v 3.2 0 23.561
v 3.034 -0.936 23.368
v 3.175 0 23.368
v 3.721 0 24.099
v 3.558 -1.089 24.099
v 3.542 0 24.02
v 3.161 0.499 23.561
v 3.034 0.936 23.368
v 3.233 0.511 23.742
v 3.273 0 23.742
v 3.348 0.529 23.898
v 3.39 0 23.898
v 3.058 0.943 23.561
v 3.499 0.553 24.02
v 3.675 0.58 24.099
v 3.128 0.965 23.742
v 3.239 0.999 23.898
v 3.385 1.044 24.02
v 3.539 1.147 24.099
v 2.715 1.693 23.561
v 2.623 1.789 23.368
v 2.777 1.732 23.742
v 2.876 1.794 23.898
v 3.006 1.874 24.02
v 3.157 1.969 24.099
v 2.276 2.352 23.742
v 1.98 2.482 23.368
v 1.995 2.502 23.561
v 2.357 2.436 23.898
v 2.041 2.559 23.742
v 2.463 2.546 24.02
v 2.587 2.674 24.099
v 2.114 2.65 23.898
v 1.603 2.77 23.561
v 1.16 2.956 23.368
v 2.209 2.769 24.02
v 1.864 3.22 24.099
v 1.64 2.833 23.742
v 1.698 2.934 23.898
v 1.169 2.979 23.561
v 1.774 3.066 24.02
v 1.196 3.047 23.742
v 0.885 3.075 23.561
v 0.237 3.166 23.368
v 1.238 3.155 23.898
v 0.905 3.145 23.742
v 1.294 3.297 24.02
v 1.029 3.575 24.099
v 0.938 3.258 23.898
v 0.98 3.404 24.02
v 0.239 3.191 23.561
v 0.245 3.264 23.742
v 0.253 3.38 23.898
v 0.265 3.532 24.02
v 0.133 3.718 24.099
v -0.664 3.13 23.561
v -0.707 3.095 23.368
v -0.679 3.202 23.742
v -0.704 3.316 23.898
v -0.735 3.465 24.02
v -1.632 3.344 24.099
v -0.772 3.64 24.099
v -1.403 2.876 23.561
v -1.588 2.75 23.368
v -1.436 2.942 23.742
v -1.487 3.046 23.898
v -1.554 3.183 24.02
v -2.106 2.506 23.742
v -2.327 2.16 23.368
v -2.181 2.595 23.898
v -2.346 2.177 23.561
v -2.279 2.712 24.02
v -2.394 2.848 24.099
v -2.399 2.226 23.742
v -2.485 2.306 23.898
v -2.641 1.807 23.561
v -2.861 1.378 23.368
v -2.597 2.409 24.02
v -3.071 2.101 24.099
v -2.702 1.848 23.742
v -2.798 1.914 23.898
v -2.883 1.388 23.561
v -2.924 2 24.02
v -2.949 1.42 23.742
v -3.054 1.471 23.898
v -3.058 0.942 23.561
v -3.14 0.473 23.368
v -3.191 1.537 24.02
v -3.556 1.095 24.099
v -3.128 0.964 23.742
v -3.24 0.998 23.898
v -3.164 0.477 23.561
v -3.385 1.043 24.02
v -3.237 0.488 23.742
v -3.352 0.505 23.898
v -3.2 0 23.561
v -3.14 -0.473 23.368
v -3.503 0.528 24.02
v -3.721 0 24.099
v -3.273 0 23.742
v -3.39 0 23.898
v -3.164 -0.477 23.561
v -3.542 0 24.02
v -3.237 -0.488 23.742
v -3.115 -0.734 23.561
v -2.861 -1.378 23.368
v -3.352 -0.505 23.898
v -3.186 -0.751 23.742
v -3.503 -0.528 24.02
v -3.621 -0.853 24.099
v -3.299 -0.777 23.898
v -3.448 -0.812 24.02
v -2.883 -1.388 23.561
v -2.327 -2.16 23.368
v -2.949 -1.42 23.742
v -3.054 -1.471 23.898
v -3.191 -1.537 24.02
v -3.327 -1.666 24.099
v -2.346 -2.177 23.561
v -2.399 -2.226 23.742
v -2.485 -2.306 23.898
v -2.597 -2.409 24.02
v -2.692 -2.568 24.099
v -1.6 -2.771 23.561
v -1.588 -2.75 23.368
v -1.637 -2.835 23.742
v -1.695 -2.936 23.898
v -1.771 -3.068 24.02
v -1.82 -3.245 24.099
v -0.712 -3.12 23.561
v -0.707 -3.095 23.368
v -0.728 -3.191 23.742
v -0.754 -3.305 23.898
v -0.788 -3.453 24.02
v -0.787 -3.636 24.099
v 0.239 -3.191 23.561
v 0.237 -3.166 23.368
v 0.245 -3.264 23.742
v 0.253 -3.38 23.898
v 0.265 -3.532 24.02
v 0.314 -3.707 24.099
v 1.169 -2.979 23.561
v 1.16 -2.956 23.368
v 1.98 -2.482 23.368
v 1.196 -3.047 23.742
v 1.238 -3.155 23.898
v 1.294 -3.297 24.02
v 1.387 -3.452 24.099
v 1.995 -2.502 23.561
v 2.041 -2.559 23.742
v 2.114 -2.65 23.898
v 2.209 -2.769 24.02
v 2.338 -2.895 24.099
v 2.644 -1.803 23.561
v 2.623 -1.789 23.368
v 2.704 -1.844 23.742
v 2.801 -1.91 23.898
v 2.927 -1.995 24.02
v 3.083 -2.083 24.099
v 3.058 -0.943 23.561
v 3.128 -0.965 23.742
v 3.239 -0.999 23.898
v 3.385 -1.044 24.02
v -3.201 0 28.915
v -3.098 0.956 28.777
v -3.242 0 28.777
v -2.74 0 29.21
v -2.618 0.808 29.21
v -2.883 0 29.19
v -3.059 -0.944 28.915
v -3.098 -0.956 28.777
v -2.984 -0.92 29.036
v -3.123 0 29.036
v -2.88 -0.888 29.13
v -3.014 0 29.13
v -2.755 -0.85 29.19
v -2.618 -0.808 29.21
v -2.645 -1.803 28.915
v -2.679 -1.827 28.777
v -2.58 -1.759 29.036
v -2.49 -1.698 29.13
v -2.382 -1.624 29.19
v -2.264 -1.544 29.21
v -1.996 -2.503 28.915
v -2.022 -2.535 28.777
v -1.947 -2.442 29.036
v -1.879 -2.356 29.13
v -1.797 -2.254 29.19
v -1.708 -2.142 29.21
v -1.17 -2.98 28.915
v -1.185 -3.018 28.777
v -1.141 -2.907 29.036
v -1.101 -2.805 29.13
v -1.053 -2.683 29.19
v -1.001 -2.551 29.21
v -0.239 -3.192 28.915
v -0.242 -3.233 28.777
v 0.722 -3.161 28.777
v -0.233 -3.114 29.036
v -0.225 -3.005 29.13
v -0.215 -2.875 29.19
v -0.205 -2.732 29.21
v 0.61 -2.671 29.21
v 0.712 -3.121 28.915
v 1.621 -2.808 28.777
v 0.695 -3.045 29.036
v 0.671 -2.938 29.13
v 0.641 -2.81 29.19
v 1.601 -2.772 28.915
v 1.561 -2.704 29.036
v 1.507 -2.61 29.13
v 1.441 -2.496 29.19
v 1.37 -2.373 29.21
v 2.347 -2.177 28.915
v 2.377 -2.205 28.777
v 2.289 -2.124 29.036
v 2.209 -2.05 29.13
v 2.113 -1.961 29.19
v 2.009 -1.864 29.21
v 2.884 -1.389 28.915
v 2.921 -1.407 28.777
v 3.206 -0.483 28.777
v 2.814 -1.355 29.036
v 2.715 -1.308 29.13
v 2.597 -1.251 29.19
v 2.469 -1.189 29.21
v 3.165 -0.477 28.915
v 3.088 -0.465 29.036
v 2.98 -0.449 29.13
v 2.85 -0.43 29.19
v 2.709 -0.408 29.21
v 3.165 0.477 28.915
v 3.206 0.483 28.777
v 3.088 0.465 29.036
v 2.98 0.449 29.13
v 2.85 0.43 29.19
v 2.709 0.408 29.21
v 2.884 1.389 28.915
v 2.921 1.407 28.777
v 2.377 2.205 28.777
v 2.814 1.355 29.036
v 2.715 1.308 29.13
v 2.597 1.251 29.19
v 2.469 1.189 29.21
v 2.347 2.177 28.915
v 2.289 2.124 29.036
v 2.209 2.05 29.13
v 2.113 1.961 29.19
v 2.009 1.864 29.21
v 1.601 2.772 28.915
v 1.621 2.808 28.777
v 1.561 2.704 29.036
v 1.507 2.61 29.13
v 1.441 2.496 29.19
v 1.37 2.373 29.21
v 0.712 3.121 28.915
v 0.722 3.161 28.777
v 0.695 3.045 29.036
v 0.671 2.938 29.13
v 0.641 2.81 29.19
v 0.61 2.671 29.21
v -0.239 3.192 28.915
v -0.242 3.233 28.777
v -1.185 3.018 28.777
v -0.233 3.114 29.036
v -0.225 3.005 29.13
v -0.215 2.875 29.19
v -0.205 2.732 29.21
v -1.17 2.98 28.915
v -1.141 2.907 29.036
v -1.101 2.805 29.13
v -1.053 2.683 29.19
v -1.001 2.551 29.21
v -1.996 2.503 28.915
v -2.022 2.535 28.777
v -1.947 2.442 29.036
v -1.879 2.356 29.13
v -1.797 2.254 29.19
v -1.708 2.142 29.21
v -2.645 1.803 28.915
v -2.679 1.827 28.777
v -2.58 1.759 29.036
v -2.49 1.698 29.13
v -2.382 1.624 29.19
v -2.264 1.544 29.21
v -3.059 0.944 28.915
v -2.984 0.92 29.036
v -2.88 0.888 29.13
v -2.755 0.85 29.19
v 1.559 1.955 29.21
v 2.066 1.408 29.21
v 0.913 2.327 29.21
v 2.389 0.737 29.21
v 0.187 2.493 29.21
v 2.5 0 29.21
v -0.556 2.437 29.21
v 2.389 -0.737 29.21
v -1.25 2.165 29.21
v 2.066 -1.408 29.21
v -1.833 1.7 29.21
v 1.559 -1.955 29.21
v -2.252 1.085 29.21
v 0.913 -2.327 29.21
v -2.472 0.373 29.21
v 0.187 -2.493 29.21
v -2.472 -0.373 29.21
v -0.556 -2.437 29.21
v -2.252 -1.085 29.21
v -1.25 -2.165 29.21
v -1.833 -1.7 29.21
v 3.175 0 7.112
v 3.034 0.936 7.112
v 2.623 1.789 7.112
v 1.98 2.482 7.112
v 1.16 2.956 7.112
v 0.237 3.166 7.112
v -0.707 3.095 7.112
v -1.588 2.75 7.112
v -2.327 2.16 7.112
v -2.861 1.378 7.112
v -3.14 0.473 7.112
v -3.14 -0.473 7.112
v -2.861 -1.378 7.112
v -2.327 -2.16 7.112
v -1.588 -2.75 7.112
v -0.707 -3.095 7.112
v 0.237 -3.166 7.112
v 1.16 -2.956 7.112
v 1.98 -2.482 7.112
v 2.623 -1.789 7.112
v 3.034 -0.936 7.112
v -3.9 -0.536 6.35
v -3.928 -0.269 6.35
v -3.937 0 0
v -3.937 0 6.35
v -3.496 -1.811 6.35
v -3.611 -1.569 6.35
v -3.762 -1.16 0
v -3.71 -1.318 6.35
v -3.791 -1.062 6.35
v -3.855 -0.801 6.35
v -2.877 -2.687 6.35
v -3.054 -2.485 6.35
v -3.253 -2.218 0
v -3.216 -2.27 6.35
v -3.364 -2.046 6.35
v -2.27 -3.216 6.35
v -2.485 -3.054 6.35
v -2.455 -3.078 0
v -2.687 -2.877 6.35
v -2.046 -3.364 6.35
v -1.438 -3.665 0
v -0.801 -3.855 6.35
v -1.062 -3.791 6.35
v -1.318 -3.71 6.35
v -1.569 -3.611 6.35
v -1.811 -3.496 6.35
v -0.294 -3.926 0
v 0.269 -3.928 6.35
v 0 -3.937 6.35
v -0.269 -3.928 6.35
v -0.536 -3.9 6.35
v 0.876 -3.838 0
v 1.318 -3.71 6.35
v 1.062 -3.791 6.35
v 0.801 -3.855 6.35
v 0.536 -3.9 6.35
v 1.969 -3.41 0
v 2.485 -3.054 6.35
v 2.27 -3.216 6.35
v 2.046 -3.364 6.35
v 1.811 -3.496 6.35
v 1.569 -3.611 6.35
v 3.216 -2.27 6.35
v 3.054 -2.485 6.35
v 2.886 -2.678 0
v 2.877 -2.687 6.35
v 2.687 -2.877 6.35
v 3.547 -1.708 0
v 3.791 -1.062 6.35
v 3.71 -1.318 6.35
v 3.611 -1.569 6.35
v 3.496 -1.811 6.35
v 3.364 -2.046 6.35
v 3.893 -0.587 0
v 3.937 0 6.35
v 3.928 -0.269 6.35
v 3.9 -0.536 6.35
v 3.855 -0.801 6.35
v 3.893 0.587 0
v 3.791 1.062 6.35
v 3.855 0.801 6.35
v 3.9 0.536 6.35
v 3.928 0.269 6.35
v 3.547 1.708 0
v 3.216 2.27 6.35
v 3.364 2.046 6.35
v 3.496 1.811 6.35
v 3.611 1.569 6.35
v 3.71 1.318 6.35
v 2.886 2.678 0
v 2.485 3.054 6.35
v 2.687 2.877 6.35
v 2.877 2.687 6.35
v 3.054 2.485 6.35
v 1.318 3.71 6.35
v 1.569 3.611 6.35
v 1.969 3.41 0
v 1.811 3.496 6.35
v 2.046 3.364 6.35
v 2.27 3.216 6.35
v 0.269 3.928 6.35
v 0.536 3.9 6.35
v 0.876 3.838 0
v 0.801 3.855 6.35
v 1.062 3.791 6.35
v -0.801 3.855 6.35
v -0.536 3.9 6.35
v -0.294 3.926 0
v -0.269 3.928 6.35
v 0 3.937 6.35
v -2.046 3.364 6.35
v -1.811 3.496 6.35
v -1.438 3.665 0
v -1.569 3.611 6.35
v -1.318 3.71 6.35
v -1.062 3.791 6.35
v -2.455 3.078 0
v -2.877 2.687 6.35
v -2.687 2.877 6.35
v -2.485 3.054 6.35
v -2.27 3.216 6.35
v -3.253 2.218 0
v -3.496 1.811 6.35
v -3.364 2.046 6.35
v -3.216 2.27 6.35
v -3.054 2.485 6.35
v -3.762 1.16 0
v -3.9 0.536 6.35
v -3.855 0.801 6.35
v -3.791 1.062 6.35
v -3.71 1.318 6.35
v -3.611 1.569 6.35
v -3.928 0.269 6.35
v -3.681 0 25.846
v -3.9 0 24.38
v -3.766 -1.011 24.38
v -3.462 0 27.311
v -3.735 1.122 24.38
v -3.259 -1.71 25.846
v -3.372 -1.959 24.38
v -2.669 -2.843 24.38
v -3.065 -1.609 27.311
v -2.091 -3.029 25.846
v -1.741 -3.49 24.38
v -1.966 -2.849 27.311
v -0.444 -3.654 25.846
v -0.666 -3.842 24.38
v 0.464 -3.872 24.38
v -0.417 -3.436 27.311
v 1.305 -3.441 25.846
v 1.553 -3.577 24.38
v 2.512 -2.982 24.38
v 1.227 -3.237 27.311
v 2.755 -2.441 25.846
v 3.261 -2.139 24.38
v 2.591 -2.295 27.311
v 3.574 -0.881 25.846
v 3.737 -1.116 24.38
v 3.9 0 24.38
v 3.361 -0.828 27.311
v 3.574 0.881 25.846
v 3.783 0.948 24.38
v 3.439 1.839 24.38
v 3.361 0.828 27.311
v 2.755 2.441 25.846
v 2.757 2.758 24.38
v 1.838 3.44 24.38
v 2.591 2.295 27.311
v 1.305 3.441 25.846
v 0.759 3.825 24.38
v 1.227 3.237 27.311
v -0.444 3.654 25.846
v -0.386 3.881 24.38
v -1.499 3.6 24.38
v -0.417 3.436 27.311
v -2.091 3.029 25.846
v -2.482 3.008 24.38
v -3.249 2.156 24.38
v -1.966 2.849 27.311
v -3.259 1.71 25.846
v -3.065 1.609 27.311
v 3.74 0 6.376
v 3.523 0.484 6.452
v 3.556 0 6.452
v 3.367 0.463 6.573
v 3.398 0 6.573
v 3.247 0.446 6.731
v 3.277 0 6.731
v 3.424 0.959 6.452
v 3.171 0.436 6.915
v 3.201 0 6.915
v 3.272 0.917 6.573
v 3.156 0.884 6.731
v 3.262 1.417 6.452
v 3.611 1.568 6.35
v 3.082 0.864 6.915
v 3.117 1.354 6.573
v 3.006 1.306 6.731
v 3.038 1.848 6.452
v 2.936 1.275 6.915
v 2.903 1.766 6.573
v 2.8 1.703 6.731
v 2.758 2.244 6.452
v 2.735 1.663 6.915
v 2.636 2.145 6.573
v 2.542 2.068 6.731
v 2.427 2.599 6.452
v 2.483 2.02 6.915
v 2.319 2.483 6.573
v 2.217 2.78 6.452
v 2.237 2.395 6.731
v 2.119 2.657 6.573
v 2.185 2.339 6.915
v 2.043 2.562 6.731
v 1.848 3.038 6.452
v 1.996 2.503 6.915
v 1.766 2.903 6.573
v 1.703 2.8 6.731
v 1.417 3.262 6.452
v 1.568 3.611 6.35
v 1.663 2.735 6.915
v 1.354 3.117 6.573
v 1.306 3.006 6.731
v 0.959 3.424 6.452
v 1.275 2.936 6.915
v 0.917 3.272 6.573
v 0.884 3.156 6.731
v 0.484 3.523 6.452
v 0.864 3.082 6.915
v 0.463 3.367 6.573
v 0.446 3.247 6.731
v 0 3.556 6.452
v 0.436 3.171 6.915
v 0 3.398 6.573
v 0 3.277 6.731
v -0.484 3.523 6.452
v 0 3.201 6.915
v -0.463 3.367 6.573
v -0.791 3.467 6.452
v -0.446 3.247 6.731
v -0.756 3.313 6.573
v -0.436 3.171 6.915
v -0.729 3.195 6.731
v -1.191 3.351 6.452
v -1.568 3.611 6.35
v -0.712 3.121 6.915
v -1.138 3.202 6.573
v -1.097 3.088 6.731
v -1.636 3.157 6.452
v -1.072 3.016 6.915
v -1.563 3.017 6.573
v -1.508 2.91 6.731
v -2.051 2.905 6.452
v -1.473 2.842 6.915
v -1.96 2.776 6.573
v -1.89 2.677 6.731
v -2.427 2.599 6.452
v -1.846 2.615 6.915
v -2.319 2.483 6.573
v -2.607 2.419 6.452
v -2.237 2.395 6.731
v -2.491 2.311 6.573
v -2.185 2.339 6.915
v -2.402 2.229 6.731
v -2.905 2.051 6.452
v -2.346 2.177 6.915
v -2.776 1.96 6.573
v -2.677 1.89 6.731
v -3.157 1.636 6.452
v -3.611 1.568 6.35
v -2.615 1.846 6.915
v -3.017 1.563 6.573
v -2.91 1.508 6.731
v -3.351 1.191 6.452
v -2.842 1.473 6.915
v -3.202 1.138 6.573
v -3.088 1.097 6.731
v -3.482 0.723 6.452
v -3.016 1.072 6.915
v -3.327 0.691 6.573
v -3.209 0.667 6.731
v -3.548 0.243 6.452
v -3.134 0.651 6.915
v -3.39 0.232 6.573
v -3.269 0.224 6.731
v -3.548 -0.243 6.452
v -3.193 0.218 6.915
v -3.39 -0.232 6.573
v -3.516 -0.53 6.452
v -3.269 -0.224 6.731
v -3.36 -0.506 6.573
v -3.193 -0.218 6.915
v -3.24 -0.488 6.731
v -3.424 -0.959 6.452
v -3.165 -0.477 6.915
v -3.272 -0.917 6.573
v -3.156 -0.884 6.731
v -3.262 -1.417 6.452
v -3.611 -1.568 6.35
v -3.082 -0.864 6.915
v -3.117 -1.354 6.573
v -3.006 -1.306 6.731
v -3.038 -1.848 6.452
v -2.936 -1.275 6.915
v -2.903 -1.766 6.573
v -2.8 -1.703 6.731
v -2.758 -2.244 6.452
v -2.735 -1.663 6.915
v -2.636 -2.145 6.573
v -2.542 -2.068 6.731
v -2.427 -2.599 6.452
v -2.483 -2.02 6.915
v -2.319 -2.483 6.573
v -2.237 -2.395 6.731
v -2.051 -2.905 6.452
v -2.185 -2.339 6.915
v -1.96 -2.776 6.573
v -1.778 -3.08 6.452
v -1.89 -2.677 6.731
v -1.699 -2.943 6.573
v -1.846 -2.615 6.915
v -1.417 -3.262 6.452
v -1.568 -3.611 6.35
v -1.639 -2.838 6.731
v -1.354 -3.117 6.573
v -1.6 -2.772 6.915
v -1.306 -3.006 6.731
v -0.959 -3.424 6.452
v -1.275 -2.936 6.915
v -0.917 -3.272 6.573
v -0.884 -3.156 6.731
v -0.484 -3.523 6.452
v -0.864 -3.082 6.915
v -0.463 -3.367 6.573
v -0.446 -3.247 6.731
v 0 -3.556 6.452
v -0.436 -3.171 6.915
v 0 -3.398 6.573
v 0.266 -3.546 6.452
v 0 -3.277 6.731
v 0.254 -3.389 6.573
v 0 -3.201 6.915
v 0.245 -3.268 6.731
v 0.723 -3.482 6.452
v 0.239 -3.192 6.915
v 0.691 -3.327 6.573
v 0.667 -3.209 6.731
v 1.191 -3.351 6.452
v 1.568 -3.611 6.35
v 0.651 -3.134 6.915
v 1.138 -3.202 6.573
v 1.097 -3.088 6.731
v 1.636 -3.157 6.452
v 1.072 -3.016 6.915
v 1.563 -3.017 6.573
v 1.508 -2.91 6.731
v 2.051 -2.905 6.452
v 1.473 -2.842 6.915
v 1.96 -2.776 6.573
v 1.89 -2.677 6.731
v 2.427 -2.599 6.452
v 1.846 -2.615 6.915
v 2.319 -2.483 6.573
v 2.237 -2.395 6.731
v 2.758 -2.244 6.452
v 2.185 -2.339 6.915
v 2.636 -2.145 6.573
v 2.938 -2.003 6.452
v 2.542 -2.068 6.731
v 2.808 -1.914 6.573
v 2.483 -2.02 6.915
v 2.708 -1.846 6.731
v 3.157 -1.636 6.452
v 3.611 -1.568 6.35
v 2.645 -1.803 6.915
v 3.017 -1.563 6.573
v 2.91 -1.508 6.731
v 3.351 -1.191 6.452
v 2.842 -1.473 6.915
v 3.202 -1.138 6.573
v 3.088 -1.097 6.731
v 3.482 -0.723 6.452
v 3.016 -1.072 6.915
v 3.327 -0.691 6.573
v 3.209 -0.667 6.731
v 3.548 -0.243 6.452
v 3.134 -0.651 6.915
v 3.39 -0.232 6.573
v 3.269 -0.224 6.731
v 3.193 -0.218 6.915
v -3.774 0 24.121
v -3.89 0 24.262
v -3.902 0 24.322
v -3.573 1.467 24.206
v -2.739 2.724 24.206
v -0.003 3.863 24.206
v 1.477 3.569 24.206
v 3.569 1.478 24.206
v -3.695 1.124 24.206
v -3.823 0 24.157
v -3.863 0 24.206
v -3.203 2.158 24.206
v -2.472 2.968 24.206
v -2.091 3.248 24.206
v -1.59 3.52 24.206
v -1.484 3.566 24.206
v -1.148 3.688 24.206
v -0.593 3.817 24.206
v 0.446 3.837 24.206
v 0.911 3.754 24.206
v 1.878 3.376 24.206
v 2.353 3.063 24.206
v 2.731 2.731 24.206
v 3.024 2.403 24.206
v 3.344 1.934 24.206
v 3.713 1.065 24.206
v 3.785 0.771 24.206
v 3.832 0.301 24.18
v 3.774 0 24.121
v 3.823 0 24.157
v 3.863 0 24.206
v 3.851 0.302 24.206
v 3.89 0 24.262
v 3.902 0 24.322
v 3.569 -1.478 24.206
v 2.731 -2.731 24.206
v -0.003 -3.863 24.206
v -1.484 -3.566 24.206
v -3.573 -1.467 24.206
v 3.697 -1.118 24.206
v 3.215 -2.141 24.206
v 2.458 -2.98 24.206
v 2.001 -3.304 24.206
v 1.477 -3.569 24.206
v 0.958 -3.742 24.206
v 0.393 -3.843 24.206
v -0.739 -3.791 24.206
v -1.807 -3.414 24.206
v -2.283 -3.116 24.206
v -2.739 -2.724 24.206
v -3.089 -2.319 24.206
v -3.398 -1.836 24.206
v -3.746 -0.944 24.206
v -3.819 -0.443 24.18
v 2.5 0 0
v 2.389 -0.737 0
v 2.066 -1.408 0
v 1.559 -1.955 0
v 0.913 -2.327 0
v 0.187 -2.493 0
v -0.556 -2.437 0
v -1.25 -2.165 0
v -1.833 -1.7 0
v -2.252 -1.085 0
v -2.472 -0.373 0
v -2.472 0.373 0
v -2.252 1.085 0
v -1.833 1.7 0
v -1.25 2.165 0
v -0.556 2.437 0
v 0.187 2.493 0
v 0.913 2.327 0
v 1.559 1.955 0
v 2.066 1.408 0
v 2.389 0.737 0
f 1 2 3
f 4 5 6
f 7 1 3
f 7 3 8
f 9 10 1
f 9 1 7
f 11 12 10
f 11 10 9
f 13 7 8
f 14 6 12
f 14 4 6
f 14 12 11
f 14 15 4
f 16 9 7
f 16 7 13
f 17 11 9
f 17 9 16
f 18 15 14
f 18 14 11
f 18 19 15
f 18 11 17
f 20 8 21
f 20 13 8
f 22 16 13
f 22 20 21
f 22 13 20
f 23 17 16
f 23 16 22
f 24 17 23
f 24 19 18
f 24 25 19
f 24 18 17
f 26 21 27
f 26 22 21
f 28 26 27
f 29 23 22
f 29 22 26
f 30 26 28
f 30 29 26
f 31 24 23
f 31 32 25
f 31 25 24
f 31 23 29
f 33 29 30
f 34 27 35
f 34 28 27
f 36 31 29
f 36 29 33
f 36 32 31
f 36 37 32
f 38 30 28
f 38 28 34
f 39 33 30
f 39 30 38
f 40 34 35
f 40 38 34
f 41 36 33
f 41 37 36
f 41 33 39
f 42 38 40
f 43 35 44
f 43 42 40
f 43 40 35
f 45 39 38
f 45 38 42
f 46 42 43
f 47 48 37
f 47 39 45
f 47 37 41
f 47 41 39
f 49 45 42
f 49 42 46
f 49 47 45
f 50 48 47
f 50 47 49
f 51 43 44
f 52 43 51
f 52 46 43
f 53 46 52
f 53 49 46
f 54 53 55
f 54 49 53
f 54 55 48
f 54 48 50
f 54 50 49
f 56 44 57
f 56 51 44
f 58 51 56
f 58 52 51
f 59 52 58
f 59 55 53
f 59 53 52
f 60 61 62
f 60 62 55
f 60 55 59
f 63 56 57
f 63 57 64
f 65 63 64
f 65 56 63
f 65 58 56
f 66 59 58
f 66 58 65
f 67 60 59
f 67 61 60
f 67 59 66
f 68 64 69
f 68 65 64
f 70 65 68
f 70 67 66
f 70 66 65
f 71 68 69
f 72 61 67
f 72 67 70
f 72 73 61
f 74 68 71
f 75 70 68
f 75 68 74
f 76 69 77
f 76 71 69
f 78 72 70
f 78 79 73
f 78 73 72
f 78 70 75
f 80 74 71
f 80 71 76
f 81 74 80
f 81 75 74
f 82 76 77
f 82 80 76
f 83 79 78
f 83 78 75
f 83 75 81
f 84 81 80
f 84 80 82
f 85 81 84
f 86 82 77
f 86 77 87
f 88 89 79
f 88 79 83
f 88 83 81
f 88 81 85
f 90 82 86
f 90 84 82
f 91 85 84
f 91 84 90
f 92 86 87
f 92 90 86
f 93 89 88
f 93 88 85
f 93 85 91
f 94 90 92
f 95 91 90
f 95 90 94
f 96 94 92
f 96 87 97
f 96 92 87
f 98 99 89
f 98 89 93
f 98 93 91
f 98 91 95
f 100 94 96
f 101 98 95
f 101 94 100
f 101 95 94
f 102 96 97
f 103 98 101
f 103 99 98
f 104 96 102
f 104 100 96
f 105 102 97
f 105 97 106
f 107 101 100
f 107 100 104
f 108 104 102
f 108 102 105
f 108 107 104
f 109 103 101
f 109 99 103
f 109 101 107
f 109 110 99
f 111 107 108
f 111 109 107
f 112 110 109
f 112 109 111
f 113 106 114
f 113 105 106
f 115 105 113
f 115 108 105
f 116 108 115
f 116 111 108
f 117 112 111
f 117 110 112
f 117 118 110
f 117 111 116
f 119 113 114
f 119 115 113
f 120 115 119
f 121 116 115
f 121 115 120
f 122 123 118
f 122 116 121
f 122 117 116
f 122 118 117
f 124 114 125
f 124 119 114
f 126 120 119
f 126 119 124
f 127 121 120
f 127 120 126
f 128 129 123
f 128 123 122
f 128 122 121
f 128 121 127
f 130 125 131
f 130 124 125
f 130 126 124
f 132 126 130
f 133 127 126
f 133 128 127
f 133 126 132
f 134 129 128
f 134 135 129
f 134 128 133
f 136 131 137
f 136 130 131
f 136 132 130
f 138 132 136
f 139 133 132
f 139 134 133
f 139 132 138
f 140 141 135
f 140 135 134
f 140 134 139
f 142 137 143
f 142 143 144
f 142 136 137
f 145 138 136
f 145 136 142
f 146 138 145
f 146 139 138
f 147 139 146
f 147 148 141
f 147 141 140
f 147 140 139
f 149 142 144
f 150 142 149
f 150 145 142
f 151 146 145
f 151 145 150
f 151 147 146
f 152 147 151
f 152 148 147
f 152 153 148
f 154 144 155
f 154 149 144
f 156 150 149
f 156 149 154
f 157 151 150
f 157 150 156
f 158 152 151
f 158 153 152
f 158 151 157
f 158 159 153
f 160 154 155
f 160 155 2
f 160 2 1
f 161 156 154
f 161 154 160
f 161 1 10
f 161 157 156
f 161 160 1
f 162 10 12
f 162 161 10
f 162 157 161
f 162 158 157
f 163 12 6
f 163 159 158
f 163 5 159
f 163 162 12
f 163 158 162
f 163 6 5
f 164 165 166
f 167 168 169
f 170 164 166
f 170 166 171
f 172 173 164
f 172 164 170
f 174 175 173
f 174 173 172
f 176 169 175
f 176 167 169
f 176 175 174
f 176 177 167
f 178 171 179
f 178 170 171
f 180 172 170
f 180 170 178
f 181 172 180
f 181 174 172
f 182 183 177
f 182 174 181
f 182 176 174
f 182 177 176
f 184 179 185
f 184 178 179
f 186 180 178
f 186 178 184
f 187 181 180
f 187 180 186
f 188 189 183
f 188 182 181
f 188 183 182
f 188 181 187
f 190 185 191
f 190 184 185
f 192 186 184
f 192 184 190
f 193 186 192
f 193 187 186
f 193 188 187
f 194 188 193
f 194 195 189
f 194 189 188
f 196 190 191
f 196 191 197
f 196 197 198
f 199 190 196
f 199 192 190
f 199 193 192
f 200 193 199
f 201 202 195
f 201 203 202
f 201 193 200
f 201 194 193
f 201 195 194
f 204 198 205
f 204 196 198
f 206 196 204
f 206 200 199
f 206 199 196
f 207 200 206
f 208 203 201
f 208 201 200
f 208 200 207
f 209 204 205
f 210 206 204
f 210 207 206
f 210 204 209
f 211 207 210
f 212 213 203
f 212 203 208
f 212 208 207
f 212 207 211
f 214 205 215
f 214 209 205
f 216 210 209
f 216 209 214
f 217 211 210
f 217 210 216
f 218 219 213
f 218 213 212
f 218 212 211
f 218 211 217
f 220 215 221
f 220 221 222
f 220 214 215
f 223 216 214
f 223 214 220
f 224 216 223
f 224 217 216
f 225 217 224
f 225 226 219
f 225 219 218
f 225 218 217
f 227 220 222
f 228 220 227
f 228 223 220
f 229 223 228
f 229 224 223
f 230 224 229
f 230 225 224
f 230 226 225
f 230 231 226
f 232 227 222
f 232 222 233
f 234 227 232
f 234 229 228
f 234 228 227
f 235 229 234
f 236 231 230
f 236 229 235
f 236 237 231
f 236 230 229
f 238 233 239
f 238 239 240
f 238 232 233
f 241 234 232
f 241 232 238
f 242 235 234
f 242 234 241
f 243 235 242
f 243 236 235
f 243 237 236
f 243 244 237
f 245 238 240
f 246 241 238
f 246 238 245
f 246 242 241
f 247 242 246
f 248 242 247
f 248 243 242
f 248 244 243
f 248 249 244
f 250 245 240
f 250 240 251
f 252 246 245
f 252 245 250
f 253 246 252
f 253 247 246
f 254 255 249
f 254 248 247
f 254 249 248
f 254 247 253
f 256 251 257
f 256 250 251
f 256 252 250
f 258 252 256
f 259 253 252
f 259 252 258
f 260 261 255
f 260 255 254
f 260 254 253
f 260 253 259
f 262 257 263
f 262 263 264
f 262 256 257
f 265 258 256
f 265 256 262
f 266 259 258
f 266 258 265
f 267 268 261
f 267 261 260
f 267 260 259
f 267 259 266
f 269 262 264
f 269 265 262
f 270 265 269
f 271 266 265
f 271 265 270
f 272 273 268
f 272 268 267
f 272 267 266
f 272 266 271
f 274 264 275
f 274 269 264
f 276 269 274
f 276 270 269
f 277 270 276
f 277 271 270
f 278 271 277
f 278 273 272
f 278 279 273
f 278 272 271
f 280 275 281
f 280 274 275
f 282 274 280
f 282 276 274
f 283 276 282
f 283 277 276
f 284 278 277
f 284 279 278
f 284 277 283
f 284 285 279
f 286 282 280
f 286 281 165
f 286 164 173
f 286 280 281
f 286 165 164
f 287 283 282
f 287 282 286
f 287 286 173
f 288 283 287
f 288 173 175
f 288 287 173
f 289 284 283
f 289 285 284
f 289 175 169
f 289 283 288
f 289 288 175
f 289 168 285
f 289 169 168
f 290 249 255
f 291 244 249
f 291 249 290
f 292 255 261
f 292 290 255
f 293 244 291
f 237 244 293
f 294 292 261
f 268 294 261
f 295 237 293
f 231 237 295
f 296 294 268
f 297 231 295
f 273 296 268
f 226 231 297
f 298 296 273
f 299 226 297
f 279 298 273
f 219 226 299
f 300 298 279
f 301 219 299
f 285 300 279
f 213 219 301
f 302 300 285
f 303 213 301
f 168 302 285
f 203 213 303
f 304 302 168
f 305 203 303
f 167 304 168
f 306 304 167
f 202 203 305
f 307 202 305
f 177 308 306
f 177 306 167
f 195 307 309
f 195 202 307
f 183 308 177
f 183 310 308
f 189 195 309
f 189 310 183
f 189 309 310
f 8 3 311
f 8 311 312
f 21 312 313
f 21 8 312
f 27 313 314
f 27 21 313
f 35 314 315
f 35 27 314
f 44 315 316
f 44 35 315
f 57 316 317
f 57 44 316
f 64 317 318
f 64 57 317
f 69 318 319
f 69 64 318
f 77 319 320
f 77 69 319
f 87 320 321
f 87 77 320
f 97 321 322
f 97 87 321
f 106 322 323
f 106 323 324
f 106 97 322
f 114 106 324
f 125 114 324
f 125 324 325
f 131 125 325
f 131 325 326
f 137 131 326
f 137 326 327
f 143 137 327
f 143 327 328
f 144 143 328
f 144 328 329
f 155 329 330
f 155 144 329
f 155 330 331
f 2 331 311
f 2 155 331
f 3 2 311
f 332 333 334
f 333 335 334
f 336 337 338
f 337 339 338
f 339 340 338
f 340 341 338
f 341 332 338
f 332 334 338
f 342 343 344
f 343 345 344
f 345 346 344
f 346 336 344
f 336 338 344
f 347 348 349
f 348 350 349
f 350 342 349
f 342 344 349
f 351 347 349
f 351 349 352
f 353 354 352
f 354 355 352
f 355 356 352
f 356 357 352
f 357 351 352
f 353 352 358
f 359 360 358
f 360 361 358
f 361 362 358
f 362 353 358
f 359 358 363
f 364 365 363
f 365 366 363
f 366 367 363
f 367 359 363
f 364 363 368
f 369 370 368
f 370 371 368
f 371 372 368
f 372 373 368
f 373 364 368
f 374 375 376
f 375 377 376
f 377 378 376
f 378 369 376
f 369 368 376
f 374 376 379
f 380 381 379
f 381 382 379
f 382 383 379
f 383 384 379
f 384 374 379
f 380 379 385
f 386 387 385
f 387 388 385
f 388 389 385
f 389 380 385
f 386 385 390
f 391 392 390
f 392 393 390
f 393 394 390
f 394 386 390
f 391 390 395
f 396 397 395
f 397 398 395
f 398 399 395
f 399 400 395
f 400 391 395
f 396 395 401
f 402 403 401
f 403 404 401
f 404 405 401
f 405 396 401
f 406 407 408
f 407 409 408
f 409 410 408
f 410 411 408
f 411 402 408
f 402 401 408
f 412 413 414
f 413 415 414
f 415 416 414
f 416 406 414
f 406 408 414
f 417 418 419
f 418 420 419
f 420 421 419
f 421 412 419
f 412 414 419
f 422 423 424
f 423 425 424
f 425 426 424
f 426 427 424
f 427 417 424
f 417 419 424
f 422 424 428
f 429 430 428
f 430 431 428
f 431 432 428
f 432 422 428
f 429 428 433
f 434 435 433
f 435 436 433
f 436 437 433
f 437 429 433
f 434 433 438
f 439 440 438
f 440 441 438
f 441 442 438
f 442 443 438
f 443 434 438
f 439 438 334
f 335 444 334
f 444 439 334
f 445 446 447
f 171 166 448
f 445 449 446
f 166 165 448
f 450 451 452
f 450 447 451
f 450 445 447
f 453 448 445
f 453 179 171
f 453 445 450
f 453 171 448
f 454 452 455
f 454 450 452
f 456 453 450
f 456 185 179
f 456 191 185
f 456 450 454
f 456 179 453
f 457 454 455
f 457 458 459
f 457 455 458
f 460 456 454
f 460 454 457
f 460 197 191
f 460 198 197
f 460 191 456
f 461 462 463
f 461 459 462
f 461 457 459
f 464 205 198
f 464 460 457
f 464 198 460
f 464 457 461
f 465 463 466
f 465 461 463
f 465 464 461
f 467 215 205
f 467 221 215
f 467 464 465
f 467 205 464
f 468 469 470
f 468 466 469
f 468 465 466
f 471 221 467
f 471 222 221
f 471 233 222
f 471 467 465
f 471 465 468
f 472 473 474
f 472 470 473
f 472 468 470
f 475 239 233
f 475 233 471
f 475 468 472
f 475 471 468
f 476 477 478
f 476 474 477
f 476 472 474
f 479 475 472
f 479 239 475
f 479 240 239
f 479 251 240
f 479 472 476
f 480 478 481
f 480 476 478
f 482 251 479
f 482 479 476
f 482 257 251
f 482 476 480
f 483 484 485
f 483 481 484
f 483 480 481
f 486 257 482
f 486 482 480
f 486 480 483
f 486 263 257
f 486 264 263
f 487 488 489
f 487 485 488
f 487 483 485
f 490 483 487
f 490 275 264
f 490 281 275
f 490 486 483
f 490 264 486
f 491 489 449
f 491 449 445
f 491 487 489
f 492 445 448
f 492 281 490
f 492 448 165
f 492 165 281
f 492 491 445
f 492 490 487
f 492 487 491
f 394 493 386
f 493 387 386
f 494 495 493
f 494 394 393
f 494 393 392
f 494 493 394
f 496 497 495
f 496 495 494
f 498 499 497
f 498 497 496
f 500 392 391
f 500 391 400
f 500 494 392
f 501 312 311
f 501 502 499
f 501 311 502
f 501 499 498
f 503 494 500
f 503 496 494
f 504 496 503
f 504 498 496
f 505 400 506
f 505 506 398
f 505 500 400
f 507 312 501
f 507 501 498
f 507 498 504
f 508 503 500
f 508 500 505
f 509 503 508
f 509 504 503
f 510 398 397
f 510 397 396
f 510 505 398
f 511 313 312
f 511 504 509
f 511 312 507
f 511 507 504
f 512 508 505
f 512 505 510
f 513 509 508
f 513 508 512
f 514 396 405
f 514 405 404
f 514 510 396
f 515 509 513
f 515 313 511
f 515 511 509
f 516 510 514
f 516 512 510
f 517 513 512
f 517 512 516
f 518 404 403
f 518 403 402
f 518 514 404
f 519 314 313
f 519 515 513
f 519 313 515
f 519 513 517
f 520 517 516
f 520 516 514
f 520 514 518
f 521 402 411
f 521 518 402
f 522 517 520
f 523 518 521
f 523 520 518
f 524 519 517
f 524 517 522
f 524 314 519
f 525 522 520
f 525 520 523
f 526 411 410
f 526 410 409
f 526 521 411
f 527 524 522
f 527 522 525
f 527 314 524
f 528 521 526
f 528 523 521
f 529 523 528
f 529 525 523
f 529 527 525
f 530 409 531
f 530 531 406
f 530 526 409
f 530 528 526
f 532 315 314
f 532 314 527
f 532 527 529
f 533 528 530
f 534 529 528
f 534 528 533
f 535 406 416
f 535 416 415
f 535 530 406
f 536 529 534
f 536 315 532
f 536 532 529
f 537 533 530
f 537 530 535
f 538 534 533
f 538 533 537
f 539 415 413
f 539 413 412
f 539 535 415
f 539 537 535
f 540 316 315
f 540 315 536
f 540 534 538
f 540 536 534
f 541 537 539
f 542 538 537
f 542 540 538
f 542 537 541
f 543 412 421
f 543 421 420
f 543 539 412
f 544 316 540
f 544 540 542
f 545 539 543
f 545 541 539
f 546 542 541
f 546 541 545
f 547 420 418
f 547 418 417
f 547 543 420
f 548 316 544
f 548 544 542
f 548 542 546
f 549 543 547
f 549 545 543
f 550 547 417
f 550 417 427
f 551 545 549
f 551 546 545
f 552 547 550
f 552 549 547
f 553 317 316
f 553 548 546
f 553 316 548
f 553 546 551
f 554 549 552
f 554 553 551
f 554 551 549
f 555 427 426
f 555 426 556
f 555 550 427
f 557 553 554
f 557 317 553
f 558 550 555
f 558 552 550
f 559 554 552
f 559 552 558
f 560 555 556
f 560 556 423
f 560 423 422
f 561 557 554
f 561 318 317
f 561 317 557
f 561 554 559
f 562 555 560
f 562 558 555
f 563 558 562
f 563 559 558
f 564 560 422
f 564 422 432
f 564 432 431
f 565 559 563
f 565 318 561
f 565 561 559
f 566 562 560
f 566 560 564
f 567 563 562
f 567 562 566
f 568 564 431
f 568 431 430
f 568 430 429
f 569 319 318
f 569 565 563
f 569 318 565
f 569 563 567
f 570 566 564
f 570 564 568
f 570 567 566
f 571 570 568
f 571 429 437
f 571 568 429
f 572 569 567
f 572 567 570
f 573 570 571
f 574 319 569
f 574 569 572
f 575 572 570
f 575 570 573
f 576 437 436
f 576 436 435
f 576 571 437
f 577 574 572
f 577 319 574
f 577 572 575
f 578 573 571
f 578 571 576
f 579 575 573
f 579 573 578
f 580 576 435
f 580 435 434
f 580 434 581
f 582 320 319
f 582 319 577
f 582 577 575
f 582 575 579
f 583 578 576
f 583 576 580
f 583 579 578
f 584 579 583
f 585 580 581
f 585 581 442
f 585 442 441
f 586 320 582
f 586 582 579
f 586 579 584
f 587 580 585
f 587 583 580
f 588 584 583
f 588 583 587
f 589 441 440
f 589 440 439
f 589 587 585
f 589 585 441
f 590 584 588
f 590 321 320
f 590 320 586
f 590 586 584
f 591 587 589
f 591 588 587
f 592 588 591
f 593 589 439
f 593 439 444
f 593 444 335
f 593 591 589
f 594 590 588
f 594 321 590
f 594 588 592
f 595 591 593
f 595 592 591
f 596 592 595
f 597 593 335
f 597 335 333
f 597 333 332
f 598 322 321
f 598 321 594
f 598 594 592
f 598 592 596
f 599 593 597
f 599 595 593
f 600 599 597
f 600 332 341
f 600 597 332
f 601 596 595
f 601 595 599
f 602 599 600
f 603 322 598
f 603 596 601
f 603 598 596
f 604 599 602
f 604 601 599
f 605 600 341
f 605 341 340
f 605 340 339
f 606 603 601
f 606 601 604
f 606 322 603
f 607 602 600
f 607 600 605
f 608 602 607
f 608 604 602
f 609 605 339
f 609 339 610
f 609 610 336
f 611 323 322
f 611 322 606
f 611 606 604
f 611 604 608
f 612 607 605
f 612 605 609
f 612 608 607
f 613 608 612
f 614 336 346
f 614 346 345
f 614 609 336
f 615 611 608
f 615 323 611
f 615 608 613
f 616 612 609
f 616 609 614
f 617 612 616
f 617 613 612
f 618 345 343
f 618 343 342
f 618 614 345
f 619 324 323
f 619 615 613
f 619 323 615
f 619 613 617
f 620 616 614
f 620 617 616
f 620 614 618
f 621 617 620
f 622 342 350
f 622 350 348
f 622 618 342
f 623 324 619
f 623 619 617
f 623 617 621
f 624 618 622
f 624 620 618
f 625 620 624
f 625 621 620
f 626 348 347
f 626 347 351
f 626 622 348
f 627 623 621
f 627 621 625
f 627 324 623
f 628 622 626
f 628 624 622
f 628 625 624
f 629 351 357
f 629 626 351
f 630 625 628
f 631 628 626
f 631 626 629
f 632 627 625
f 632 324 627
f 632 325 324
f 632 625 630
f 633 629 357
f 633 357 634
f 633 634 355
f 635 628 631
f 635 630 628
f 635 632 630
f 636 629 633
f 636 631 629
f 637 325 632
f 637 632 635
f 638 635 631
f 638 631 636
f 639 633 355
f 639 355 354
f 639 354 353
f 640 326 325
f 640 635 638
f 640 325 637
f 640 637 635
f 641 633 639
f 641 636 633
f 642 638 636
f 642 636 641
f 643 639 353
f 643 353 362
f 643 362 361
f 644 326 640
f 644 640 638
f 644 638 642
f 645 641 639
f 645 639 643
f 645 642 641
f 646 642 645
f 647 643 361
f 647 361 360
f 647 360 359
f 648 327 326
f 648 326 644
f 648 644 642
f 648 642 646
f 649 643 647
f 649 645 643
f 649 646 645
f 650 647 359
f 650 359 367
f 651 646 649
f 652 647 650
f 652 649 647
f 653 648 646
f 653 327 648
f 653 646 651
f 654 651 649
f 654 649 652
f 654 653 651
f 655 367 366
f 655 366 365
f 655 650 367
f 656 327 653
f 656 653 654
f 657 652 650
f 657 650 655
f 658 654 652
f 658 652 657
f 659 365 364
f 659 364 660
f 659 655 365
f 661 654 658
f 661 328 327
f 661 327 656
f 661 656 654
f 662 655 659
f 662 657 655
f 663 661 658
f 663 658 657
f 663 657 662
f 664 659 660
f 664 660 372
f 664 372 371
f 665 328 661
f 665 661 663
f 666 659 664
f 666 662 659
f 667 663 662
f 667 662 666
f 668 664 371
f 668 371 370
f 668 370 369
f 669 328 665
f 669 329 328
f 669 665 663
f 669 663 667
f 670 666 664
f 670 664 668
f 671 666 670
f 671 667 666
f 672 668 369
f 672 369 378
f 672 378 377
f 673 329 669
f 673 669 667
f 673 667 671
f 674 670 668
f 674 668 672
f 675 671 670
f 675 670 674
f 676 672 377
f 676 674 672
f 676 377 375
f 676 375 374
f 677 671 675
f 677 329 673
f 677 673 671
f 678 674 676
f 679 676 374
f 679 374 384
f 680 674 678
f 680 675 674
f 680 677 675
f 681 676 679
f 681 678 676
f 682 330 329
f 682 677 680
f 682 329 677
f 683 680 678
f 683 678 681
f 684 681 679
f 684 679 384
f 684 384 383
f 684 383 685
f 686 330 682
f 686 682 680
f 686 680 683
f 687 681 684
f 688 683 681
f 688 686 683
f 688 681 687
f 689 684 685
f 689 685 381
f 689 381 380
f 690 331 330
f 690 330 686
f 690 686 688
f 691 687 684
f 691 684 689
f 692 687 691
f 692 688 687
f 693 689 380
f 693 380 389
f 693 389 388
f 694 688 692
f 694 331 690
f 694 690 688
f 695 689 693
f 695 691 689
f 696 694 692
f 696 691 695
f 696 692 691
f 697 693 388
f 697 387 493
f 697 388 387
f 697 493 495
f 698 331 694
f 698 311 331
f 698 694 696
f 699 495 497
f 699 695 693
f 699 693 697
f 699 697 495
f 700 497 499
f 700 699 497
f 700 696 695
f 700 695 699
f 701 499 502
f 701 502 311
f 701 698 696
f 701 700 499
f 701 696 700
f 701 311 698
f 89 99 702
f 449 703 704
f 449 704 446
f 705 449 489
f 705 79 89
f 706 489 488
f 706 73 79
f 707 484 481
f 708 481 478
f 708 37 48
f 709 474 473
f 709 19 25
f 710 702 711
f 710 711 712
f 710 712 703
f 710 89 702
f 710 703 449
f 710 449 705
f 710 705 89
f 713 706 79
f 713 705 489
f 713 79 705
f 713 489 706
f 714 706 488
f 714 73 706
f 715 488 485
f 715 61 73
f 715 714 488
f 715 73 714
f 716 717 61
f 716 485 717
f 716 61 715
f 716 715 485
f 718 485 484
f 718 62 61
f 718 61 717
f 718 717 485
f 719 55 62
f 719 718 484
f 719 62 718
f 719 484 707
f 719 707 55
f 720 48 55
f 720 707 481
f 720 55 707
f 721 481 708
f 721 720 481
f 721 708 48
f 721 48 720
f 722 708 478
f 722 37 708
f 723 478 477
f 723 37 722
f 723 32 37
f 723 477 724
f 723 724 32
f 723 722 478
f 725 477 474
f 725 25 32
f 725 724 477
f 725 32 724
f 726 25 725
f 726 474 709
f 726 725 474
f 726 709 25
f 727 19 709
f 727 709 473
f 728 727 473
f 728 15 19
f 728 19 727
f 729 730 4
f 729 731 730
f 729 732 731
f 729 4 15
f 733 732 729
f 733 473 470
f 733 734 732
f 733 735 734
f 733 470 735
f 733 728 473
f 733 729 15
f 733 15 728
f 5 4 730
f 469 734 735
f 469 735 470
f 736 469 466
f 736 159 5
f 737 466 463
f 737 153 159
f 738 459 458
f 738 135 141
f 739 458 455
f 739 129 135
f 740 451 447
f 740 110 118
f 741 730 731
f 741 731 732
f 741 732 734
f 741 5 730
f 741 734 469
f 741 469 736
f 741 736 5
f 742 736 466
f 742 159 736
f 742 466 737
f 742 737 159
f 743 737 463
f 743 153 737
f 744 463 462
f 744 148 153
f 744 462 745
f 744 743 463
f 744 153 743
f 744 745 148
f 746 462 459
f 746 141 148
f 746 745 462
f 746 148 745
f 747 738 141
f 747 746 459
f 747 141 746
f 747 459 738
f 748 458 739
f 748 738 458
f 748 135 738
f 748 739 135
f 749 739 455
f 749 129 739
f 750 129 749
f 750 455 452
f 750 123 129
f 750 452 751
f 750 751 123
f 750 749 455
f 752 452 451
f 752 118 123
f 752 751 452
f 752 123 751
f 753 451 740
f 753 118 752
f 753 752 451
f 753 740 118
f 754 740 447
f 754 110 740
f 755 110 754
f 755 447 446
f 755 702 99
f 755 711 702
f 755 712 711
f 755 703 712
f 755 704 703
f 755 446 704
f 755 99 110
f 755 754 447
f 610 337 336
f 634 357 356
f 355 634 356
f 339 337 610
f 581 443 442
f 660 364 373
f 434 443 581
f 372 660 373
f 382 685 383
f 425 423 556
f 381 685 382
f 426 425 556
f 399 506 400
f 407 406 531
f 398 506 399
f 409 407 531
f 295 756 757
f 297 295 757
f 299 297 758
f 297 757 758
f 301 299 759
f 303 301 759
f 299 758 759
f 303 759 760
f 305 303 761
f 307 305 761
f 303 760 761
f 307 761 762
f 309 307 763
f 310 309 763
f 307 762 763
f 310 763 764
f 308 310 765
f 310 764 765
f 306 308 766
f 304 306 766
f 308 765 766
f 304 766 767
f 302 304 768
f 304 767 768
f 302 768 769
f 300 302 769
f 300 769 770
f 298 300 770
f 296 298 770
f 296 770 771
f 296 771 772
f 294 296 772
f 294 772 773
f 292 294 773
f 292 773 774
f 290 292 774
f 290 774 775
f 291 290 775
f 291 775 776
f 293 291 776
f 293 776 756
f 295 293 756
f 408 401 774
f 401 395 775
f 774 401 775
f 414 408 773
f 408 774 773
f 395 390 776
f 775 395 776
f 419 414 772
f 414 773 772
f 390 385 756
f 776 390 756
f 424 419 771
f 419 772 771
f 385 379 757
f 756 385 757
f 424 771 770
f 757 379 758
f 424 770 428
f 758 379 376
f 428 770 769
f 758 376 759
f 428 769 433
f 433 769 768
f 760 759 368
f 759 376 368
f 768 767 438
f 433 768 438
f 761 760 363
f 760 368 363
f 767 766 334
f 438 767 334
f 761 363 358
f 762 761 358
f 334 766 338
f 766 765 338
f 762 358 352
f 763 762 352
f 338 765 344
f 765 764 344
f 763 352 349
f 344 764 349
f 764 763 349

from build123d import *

# Parameters (mm, degrees)
SKETCH1_R           = 3.937
BOSS_EXTRUDE1_DEPTH = 29.21
SKETCH2_R           = 2.5
CUT_EXTRUDE1_START  = -5.08
SKETCH3_R           = 5.08
SKETCH3_R_2         = 3.175
CUT_EXTRUDE1_DEPTH  = 17.78
FILLET1_R           = 0.762
FILLET2_R           = 0.762
CHAMFER1_SIZE       = 5.08
CHAMFER1_SIZE_2     = 0.759211087
FILLET3_R           = 0.254
FILLET4_R           = 0.508


# Some blends are built 0.0001 mm under size
with BuildPart() as part:
    # Sketch1 → Boss-Extrude1 (new body)
    with BuildSketch(Plane.XY):
        with Locations(Location((0, 0, 0), (0, 0, 180))):
            Circle(SKETCH1_R)
    extrude(amount=BOSS_EXTRUDE1_DEPTH)

    # Cut-Sweep1: sweep along a curve in space
    with BuildLine() as cut_sweep1_path:
        Line((0, 0, 29.21), (0, 0, 0))
    # Sketch2 → Cut-Sweep1 (sweep, cut)
    with BuildSketch(Plane.XY.offset(29.21)):
        Circle(SKETCH2_R)
    sweep(path=cut_sweep1_path.line, mode=Mode.SUBTRACT)

    # Sketch3 → Cut-Extrude1 (cut)
    with BuildSketch(Plane.XY.offset(29.21).offset(CUT_EXTRUDE1_START)):
        Circle(SKETCH3_R)
        Circle(SKETCH3_R_2, mode=Mode.SUBTRACT)
    extrude(amount=-CUT_EXTRUDE1_DEPTH, mode=Mode.SUBTRACT)

    # Fillet1
    fillet1_edges = [part.edges().sort_by_distance(p)[0] for p in [
        (-3.175, 0, 6.35),
    ]]
    fillet(fillet1_edges, radius=FILLET1_R - 0.0001)  # a hair under: the kernel refuses the full size

    # Fillet2
    fillet2_edges = [part.edges().sort_by_distance(p)[0] for p in [
        (-3.175, 0, 24.13),
    ]]
    fillet(fillet2_edges, radius=FILLET2_R - 0.0001)  # a hair under: the kernel refuses the full size

    # Chamfer1
    # the kernel refuses this chamfer: 5.08, 0.759211087 mm, written as the material it takes off along each edge
    with BuildSketch(Plane(origin=(0, 0, 29.21), x_dir=(-1, 0, 0), z_dir=(0, 1, 0))) as chamfer1_piece_1:
        Polygon((3.937, -CHAMFER1_SIZE), (3.937 - CHAMFER1_SIZE_2, 0), (3.937, 0), align=None)
    revolve(axis=Axis((0, 0, 29.21), (0, 0, 1)), mode=Mode.SUBTRACT)

    # Fillet3
    fillet3_edges = [part.edges().sort_by_distance(p)[0] for p in [
        (3.937, 0, 24.13),
    ]]
    fillet(fillet3_edges, radius=FILLET3_R)

    # Fillet4
    fillet4_edges = [part.edges().sort_by_distance(p)[0] for p in [
        (3.177788913, 0, 29.21),
    ]]
    fillet(fillet4_edges, radius=FILLET4_R)


solid = part.part
